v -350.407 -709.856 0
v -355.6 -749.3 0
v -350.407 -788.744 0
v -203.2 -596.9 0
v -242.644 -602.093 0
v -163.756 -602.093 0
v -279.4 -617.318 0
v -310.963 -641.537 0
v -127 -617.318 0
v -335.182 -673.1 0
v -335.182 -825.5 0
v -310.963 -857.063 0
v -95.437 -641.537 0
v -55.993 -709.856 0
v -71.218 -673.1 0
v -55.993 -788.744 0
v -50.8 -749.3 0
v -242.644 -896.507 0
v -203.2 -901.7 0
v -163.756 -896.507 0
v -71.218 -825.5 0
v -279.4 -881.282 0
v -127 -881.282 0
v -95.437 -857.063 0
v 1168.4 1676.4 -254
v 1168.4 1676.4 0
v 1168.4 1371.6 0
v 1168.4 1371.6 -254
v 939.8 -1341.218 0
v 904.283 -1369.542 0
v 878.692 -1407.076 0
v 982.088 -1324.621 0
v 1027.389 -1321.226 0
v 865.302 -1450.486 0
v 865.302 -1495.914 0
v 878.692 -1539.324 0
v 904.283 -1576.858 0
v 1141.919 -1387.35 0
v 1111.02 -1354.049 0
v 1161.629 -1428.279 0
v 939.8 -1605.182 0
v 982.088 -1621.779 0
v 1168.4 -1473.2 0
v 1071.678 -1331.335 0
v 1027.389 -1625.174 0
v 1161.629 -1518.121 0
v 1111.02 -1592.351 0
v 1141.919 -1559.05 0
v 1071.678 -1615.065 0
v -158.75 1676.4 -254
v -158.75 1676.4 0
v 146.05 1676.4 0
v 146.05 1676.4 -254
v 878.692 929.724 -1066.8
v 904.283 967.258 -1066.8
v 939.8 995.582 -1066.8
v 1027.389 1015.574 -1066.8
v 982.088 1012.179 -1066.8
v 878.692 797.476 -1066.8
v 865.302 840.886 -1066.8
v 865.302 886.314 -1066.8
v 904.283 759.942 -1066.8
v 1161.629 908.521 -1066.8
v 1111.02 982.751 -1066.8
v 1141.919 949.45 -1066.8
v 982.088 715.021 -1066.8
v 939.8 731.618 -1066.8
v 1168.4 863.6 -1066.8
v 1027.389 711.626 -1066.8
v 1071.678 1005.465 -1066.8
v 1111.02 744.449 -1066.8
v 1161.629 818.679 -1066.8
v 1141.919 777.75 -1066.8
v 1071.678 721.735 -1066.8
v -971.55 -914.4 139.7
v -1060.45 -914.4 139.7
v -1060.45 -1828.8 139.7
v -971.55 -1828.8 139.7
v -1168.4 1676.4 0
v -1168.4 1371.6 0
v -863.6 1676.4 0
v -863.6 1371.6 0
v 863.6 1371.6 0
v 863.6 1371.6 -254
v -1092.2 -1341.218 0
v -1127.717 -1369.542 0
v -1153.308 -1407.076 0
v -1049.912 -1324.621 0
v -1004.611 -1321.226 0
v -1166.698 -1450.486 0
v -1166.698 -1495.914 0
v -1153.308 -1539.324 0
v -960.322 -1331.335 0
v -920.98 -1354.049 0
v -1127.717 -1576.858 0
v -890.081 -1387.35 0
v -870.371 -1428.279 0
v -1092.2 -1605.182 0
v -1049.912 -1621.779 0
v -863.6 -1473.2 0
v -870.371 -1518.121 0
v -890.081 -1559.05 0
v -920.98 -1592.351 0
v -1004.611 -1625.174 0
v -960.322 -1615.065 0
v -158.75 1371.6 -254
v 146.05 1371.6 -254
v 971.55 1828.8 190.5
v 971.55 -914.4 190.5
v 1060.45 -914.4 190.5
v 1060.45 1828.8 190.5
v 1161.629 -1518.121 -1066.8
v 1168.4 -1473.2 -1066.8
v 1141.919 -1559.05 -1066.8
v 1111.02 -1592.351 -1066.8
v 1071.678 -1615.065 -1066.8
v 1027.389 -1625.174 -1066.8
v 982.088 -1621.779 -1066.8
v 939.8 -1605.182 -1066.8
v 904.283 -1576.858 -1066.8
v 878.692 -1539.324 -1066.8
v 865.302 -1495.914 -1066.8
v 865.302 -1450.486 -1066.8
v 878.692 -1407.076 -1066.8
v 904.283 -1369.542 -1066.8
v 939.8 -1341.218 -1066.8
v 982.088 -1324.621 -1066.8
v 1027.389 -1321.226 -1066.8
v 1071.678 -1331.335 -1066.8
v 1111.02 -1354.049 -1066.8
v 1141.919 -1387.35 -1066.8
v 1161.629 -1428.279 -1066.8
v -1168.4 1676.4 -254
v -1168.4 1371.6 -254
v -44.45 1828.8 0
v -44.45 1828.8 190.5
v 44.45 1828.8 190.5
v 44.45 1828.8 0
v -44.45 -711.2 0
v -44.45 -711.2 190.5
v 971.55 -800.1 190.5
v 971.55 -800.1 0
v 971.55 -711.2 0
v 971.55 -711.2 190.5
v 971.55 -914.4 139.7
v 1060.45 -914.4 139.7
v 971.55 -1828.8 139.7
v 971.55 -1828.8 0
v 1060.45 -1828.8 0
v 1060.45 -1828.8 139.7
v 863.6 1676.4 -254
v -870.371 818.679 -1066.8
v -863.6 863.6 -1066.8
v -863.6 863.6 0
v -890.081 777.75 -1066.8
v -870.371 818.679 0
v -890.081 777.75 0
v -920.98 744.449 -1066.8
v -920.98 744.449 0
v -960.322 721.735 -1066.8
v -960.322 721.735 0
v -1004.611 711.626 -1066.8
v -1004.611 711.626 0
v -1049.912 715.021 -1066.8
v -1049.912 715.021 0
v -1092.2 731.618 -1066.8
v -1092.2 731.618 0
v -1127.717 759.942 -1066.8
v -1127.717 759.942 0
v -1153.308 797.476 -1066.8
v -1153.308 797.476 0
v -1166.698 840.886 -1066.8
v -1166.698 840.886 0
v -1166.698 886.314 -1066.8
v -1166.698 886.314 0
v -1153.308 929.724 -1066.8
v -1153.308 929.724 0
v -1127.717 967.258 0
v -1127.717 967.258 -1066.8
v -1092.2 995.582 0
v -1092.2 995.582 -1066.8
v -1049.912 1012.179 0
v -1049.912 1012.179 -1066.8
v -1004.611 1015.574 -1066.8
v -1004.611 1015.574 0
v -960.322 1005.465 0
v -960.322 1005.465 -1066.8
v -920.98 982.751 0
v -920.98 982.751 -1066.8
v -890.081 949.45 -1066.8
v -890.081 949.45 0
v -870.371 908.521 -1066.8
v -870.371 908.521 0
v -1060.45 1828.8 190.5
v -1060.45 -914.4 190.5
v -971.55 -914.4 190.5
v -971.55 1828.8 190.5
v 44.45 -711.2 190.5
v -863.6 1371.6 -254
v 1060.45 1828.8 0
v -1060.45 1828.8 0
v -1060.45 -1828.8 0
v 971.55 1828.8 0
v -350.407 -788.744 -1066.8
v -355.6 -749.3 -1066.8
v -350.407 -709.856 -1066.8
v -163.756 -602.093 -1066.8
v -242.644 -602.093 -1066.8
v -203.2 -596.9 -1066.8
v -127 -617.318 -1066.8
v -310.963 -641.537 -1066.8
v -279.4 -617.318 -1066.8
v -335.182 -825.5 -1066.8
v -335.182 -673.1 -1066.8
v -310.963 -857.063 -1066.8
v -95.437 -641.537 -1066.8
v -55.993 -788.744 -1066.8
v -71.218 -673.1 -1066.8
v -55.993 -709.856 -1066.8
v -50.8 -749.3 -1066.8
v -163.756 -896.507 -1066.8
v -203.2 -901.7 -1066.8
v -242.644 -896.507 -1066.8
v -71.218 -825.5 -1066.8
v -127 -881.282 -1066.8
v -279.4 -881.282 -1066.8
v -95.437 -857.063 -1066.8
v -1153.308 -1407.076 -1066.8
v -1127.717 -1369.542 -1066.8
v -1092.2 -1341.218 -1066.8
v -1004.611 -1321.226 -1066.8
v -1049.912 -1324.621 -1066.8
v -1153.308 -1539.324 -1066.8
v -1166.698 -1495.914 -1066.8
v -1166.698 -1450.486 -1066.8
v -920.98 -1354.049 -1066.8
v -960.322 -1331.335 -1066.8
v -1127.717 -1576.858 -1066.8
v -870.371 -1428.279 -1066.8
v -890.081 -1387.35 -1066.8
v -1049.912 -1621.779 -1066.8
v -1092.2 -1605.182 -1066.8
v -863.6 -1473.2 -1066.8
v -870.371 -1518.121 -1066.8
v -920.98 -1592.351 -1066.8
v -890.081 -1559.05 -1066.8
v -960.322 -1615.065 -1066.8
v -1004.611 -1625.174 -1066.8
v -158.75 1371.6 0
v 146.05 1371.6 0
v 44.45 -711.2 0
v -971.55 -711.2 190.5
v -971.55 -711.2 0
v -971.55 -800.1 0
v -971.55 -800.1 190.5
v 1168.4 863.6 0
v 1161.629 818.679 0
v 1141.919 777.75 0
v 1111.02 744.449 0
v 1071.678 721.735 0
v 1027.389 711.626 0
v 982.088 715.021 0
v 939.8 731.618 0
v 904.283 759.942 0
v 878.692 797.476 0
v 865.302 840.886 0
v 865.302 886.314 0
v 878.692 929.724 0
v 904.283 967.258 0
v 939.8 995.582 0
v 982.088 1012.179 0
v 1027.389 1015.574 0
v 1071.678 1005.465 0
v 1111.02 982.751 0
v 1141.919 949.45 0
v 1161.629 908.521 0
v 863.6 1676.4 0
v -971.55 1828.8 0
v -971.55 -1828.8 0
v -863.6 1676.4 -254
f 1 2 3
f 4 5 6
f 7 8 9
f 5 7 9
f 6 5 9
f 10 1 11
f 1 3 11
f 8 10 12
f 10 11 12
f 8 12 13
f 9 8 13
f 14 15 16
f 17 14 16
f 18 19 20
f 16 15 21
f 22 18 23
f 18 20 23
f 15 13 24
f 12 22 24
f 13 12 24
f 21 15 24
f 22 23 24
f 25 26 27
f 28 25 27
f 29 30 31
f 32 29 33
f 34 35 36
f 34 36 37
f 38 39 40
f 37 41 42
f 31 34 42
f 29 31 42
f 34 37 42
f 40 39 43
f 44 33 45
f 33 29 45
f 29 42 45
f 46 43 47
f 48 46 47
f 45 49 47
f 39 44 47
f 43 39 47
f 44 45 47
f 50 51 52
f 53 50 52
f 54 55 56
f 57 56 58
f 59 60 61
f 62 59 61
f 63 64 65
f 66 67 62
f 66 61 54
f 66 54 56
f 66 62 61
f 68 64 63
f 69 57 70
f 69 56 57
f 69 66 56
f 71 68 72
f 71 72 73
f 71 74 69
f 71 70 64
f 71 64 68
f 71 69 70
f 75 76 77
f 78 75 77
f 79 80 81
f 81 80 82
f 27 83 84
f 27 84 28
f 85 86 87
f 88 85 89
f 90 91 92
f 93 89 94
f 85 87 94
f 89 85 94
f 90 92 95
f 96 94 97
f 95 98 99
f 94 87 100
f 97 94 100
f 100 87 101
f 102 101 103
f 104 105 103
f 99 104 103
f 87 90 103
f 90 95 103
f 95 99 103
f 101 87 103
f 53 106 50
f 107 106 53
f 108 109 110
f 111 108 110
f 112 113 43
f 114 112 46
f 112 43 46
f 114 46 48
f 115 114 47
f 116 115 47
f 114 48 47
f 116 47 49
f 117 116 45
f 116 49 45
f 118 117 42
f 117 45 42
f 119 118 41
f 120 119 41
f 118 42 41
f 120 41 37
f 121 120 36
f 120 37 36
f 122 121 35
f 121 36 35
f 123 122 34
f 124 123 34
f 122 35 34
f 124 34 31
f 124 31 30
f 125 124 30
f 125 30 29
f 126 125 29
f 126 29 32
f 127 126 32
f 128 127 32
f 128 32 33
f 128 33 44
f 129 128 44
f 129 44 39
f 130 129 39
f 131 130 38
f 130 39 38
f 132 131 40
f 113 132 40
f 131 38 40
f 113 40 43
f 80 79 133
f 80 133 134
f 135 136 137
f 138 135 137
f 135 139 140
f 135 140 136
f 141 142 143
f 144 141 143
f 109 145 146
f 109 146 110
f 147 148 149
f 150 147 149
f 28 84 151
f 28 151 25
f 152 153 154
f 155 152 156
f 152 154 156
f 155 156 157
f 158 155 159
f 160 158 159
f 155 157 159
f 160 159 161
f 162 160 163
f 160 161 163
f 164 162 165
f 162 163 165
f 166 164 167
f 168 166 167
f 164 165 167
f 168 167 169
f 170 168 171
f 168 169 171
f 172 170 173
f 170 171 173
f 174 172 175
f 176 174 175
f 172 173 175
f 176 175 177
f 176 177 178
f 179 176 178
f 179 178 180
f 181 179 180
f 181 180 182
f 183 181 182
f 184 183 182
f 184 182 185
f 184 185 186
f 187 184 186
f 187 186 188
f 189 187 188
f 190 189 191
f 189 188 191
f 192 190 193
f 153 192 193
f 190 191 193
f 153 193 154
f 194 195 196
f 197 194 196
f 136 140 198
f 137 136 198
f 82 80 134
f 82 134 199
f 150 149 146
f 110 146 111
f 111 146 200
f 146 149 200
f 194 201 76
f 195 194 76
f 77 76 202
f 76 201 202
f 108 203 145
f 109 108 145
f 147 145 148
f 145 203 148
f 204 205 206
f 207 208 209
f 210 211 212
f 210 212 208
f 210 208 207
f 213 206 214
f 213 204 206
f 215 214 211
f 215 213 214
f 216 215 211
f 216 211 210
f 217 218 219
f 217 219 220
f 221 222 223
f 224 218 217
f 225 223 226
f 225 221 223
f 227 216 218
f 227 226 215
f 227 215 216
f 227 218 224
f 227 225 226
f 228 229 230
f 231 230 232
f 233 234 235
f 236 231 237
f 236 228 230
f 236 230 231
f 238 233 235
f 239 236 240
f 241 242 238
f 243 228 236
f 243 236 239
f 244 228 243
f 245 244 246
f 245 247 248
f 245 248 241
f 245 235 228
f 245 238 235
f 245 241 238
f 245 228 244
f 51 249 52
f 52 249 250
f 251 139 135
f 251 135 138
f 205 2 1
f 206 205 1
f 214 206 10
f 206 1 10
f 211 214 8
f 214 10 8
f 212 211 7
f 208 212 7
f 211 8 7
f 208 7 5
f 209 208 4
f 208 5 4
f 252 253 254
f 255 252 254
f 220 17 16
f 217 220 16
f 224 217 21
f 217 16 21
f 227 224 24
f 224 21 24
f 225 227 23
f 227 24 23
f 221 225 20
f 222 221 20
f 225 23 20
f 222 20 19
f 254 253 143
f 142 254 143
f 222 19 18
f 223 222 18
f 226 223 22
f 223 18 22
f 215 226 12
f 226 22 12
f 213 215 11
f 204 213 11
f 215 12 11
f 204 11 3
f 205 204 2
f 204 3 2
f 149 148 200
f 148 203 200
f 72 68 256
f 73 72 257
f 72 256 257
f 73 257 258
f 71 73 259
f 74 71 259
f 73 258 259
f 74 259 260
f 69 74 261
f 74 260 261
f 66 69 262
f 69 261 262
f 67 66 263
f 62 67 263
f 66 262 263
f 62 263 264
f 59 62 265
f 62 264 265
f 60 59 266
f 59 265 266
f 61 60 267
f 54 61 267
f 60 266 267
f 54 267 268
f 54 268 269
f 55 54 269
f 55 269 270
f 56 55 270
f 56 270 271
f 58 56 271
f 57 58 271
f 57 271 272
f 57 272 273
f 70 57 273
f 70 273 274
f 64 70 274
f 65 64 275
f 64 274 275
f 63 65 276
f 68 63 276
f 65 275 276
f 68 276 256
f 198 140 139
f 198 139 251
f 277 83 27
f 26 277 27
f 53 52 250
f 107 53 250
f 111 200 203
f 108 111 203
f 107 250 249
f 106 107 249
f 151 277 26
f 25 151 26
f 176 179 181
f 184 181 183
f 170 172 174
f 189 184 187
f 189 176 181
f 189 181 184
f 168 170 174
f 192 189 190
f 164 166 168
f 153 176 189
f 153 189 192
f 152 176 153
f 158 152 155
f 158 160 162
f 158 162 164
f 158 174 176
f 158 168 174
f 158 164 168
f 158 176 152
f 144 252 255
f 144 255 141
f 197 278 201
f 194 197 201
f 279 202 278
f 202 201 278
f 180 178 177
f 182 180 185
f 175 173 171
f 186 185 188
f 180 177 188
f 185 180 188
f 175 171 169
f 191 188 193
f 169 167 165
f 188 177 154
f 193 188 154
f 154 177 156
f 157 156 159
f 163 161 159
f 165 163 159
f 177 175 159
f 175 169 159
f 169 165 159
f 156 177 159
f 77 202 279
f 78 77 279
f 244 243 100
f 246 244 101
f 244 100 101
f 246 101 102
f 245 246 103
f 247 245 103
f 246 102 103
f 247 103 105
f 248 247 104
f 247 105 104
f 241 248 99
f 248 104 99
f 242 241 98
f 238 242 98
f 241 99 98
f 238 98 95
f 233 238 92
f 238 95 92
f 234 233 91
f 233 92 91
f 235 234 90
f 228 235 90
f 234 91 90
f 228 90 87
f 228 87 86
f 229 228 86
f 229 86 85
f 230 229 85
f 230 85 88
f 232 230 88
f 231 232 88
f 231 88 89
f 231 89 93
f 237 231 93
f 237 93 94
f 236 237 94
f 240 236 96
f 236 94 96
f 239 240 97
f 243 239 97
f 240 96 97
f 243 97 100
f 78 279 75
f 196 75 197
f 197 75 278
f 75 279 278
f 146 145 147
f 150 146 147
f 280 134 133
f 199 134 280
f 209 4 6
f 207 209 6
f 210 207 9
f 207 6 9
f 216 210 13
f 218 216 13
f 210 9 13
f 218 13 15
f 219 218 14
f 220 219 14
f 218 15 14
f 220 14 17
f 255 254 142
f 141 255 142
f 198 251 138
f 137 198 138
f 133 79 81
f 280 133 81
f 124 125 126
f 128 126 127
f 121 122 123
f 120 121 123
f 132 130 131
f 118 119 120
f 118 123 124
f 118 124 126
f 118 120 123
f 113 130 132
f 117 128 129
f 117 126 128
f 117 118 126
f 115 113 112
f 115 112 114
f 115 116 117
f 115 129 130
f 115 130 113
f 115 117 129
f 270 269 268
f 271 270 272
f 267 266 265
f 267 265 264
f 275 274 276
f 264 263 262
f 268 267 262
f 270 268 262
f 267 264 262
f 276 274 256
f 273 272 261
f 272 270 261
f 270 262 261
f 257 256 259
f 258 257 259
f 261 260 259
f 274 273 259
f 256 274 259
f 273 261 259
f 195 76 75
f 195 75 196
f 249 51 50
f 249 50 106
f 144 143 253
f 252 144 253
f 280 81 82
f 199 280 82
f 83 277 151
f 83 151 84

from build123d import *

# Parameters (mm, degrees)
F1_DEPTH  = 190.5
F2_DEPTH  = 190.5
F0_W      = 88.9
F0_H      = 2540
F3_DEPTH  = 190.5
F5_W      = 914.4
F5_H      = 50.8
F6_DEPTH  = 2120.901
F4_W      = 914.4
F4_H      = 50.8
F7_DEPTH  = 2120.901
F8_R      = 152.4
F9_DEPTH  = 1066.8
F10_DEPTH = 1066.8
F11_DEPTH = 1066.8
F12_DEPTH = 1066.8
F13_DEPTH = 1066.8
F14_DEPTH = 190.5
F8_W      = 304.8
F8_H      = 304.8
F15_DEPTH = 254
F8_W_2    = 114.3
F8_W_3    = 88.9
F8_W_4    = 101.6


with BuildPart() as f1:
    # F0 (on Top) → F1 (new body)
    with BuildSketch(Plane.XY):
        Polygon((-1060.45, -1828.8), (-971.55, -1828.8), (-971.55, -800.1), (-971.55, -711.2), (-971.55, 1828.8), (-1060.45, 1828.8), align=None)
    extrude(amount=F1_DEPTH)


with BuildPart() as f2:
    # F0 (on Top) → F2 (new body)
    with BuildSketch(Plane.XY):
        Polygon((971.55, -711.2), (971.55, -800.1), (971.55, -1828.8), (1060.45, -1828.8), (1060.45, 1828.8), (971.55, 1828.8), align=None)
    extrude(amount=F2_DEPTH)


with BuildPart() as f3:
    # F0 (on Top) → F3 (new body)
    with BuildSketch(Plane.XY):
        with Locations((0, 558.8)):
            Rectangle(F0_W, F0_H)
    extrude(amount=F3_DEPTH)


with BuildPart() as f6_tool:
    # F5 (on face) → F6 (new body, through all)
    with BuildSketch(Plane(origin=(-1060.45, 0, 0), x_dir=(0, -1, 0), z_dir=(-1, 0, 0))):
        with Locations((1371.6, 165.1)):
            Rectangle(F5_W, F5_H)
    extrude(amount=-F6_DEPTH)


with BuildPart() as f1_1:
    add(f1.part)

    # F6: cut by f6_tool
    add(f6_tool.part, mode=Mode.SUBTRACT)

    # F4 (on face) → F7 (cut, through all)
    with BuildSketch(Plane.YZ.offset(1060.45)):
        with Locations((-1371.6, 165.1)):
            Rectangle(F4_W, F4_H)
    extrude(amount=-F7_DEPTH, mode=Mode.SUBTRACT)


with BuildPart() as f2_1:
    add(f2.part)

    # F6: cut by f6_tool
    add(f6_tool.part, mode=Mode.SUBTRACT)


with BuildPart() as f9:
    # F8 (on face) → F9 (new body)
    with BuildSketch(Plane(origin=(0, 0, 0), x_dir=(1, 0, 0), z_dir=(0, 0, -1))):
        with Locations((-1016, 1473.2)):
            Circle(F8_R)
    extrude(amount=F9_DEPTH)


with BuildPart() as f10:
    # F8 (on face) → F10 (new body)
    with BuildSketch(Plane(origin=(0, 0, 0), x_dir=(1, 0, 0), z_dir=(0, 0, -1))):
        with Locations((1016, 1473.2)):
            Circle(F8_R)
    extrude(amount=F10_DEPTH)


with BuildPart() as f11:
    # F8 (on face) → F11 (new body)
    with BuildSketch(Plane(origin=(0, 0, 0), x_dir=(1, 0, 0), z_dir=(0, 0, -1))):
        with Locations((1016, -863.6)):
            Circle(F8_R)
    extrude(amount=F11_DEPTH)


with BuildPart() as f12:
    # F8 (on face) → F12 (new body)
    with BuildSketch(Plane(origin=(0, 0, 0), x_dir=(1, 0, 0), z_dir=(0, 0, -1))):
        with Locations((-1016, -863.6)):
            Circle(F8_R)
    extrude(amount=F12_DEPTH)


with BuildPart() as f13:
    # F8 (on face) → F13 (new body)
    with BuildSketch(Plane(origin=(0, 0, 0), x_dir=(1, 0, 0), z_dir=(0, 0, -1))):
        with BuildLine():
            ThreePointArc((-203.2, 596.9), (-95.4369265472, 641.5369265472), (-50.8, 749.3))
            ThreePointArc((-50.8, 749.3), (-95.4369265472, 857.0630734528), (-203.2, 901.7))
            ThreePointArc((-203.2, 901.7), (-310.9630734528, 857.0630734528), (-355.6, 749.3))
            ThreePointArc((-355.6, 749.3), (-310.9630734528, 641.5369265472), (-203.2, 596.9))
        make_face()
    extrude(amount=F13_DEPTH)


with BuildPart() as f14:
    # F0 (on Top) → F14 (new body)
    with BuildSketch(Plane.XY):
        Polygon((-971.55, -711.2), (-971.55, -800.1), (971.55, -800.1), (971.55, -711.2), (44.45, -711.2), (-44.45, -711.2), align=None)
    extrude(amount=F14_DEPTH)


with BuildPart() as f15:
    # F8 (on face) → F15 (new body)
    with BuildSketch(Plane(origin=(0, 0, 0), x_dir=(1, 0, 0), z_dir=(0, 0, -1))):
        with Locations((1016, -1524)):
            Rectangle(F8_W, F8_H)
    extrude(amount=F15_DEPTH)


with BuildPart() as f15b:
    # F8 (on face) → F15, piece 2 (new body)
    with BuildSketch(Plane(origin=(0, 0, 0), x_dir=(1, 0, 0), z_dir=(0, 0, -1))):
        with Locations((-1016, -1524)):
            Rectangle(F8_W, F8_H)
    extrude(amount=F15_DEPTH)


with BuildPart() as f15c:
    # F8 (on face) → F15, piece 3 (new body)
    with BuildSketch(Plane(origin=(0, 0, 0), x_dir=(1, 0, 0), z_dir=(0, 0, -1))):
        with Locations((-101.6, -1524)):
            Rectangle(F8_W_2, F8_H)
        with Locations((0, -1524)):
            Rectangle(F8_W_3, F8_H)
        with Locations((95.25, -1524)):
            Rectangle(F8_W_4, F8_H)
    extrude(amount=F15_DEPTH)


solid = Compound([f3.part, f1_1.part, f2_1.part, f9.part, f10.part, f11.part, f12.part, f13.part, f14.part, f15.part, f15b.part, f15c.part])
